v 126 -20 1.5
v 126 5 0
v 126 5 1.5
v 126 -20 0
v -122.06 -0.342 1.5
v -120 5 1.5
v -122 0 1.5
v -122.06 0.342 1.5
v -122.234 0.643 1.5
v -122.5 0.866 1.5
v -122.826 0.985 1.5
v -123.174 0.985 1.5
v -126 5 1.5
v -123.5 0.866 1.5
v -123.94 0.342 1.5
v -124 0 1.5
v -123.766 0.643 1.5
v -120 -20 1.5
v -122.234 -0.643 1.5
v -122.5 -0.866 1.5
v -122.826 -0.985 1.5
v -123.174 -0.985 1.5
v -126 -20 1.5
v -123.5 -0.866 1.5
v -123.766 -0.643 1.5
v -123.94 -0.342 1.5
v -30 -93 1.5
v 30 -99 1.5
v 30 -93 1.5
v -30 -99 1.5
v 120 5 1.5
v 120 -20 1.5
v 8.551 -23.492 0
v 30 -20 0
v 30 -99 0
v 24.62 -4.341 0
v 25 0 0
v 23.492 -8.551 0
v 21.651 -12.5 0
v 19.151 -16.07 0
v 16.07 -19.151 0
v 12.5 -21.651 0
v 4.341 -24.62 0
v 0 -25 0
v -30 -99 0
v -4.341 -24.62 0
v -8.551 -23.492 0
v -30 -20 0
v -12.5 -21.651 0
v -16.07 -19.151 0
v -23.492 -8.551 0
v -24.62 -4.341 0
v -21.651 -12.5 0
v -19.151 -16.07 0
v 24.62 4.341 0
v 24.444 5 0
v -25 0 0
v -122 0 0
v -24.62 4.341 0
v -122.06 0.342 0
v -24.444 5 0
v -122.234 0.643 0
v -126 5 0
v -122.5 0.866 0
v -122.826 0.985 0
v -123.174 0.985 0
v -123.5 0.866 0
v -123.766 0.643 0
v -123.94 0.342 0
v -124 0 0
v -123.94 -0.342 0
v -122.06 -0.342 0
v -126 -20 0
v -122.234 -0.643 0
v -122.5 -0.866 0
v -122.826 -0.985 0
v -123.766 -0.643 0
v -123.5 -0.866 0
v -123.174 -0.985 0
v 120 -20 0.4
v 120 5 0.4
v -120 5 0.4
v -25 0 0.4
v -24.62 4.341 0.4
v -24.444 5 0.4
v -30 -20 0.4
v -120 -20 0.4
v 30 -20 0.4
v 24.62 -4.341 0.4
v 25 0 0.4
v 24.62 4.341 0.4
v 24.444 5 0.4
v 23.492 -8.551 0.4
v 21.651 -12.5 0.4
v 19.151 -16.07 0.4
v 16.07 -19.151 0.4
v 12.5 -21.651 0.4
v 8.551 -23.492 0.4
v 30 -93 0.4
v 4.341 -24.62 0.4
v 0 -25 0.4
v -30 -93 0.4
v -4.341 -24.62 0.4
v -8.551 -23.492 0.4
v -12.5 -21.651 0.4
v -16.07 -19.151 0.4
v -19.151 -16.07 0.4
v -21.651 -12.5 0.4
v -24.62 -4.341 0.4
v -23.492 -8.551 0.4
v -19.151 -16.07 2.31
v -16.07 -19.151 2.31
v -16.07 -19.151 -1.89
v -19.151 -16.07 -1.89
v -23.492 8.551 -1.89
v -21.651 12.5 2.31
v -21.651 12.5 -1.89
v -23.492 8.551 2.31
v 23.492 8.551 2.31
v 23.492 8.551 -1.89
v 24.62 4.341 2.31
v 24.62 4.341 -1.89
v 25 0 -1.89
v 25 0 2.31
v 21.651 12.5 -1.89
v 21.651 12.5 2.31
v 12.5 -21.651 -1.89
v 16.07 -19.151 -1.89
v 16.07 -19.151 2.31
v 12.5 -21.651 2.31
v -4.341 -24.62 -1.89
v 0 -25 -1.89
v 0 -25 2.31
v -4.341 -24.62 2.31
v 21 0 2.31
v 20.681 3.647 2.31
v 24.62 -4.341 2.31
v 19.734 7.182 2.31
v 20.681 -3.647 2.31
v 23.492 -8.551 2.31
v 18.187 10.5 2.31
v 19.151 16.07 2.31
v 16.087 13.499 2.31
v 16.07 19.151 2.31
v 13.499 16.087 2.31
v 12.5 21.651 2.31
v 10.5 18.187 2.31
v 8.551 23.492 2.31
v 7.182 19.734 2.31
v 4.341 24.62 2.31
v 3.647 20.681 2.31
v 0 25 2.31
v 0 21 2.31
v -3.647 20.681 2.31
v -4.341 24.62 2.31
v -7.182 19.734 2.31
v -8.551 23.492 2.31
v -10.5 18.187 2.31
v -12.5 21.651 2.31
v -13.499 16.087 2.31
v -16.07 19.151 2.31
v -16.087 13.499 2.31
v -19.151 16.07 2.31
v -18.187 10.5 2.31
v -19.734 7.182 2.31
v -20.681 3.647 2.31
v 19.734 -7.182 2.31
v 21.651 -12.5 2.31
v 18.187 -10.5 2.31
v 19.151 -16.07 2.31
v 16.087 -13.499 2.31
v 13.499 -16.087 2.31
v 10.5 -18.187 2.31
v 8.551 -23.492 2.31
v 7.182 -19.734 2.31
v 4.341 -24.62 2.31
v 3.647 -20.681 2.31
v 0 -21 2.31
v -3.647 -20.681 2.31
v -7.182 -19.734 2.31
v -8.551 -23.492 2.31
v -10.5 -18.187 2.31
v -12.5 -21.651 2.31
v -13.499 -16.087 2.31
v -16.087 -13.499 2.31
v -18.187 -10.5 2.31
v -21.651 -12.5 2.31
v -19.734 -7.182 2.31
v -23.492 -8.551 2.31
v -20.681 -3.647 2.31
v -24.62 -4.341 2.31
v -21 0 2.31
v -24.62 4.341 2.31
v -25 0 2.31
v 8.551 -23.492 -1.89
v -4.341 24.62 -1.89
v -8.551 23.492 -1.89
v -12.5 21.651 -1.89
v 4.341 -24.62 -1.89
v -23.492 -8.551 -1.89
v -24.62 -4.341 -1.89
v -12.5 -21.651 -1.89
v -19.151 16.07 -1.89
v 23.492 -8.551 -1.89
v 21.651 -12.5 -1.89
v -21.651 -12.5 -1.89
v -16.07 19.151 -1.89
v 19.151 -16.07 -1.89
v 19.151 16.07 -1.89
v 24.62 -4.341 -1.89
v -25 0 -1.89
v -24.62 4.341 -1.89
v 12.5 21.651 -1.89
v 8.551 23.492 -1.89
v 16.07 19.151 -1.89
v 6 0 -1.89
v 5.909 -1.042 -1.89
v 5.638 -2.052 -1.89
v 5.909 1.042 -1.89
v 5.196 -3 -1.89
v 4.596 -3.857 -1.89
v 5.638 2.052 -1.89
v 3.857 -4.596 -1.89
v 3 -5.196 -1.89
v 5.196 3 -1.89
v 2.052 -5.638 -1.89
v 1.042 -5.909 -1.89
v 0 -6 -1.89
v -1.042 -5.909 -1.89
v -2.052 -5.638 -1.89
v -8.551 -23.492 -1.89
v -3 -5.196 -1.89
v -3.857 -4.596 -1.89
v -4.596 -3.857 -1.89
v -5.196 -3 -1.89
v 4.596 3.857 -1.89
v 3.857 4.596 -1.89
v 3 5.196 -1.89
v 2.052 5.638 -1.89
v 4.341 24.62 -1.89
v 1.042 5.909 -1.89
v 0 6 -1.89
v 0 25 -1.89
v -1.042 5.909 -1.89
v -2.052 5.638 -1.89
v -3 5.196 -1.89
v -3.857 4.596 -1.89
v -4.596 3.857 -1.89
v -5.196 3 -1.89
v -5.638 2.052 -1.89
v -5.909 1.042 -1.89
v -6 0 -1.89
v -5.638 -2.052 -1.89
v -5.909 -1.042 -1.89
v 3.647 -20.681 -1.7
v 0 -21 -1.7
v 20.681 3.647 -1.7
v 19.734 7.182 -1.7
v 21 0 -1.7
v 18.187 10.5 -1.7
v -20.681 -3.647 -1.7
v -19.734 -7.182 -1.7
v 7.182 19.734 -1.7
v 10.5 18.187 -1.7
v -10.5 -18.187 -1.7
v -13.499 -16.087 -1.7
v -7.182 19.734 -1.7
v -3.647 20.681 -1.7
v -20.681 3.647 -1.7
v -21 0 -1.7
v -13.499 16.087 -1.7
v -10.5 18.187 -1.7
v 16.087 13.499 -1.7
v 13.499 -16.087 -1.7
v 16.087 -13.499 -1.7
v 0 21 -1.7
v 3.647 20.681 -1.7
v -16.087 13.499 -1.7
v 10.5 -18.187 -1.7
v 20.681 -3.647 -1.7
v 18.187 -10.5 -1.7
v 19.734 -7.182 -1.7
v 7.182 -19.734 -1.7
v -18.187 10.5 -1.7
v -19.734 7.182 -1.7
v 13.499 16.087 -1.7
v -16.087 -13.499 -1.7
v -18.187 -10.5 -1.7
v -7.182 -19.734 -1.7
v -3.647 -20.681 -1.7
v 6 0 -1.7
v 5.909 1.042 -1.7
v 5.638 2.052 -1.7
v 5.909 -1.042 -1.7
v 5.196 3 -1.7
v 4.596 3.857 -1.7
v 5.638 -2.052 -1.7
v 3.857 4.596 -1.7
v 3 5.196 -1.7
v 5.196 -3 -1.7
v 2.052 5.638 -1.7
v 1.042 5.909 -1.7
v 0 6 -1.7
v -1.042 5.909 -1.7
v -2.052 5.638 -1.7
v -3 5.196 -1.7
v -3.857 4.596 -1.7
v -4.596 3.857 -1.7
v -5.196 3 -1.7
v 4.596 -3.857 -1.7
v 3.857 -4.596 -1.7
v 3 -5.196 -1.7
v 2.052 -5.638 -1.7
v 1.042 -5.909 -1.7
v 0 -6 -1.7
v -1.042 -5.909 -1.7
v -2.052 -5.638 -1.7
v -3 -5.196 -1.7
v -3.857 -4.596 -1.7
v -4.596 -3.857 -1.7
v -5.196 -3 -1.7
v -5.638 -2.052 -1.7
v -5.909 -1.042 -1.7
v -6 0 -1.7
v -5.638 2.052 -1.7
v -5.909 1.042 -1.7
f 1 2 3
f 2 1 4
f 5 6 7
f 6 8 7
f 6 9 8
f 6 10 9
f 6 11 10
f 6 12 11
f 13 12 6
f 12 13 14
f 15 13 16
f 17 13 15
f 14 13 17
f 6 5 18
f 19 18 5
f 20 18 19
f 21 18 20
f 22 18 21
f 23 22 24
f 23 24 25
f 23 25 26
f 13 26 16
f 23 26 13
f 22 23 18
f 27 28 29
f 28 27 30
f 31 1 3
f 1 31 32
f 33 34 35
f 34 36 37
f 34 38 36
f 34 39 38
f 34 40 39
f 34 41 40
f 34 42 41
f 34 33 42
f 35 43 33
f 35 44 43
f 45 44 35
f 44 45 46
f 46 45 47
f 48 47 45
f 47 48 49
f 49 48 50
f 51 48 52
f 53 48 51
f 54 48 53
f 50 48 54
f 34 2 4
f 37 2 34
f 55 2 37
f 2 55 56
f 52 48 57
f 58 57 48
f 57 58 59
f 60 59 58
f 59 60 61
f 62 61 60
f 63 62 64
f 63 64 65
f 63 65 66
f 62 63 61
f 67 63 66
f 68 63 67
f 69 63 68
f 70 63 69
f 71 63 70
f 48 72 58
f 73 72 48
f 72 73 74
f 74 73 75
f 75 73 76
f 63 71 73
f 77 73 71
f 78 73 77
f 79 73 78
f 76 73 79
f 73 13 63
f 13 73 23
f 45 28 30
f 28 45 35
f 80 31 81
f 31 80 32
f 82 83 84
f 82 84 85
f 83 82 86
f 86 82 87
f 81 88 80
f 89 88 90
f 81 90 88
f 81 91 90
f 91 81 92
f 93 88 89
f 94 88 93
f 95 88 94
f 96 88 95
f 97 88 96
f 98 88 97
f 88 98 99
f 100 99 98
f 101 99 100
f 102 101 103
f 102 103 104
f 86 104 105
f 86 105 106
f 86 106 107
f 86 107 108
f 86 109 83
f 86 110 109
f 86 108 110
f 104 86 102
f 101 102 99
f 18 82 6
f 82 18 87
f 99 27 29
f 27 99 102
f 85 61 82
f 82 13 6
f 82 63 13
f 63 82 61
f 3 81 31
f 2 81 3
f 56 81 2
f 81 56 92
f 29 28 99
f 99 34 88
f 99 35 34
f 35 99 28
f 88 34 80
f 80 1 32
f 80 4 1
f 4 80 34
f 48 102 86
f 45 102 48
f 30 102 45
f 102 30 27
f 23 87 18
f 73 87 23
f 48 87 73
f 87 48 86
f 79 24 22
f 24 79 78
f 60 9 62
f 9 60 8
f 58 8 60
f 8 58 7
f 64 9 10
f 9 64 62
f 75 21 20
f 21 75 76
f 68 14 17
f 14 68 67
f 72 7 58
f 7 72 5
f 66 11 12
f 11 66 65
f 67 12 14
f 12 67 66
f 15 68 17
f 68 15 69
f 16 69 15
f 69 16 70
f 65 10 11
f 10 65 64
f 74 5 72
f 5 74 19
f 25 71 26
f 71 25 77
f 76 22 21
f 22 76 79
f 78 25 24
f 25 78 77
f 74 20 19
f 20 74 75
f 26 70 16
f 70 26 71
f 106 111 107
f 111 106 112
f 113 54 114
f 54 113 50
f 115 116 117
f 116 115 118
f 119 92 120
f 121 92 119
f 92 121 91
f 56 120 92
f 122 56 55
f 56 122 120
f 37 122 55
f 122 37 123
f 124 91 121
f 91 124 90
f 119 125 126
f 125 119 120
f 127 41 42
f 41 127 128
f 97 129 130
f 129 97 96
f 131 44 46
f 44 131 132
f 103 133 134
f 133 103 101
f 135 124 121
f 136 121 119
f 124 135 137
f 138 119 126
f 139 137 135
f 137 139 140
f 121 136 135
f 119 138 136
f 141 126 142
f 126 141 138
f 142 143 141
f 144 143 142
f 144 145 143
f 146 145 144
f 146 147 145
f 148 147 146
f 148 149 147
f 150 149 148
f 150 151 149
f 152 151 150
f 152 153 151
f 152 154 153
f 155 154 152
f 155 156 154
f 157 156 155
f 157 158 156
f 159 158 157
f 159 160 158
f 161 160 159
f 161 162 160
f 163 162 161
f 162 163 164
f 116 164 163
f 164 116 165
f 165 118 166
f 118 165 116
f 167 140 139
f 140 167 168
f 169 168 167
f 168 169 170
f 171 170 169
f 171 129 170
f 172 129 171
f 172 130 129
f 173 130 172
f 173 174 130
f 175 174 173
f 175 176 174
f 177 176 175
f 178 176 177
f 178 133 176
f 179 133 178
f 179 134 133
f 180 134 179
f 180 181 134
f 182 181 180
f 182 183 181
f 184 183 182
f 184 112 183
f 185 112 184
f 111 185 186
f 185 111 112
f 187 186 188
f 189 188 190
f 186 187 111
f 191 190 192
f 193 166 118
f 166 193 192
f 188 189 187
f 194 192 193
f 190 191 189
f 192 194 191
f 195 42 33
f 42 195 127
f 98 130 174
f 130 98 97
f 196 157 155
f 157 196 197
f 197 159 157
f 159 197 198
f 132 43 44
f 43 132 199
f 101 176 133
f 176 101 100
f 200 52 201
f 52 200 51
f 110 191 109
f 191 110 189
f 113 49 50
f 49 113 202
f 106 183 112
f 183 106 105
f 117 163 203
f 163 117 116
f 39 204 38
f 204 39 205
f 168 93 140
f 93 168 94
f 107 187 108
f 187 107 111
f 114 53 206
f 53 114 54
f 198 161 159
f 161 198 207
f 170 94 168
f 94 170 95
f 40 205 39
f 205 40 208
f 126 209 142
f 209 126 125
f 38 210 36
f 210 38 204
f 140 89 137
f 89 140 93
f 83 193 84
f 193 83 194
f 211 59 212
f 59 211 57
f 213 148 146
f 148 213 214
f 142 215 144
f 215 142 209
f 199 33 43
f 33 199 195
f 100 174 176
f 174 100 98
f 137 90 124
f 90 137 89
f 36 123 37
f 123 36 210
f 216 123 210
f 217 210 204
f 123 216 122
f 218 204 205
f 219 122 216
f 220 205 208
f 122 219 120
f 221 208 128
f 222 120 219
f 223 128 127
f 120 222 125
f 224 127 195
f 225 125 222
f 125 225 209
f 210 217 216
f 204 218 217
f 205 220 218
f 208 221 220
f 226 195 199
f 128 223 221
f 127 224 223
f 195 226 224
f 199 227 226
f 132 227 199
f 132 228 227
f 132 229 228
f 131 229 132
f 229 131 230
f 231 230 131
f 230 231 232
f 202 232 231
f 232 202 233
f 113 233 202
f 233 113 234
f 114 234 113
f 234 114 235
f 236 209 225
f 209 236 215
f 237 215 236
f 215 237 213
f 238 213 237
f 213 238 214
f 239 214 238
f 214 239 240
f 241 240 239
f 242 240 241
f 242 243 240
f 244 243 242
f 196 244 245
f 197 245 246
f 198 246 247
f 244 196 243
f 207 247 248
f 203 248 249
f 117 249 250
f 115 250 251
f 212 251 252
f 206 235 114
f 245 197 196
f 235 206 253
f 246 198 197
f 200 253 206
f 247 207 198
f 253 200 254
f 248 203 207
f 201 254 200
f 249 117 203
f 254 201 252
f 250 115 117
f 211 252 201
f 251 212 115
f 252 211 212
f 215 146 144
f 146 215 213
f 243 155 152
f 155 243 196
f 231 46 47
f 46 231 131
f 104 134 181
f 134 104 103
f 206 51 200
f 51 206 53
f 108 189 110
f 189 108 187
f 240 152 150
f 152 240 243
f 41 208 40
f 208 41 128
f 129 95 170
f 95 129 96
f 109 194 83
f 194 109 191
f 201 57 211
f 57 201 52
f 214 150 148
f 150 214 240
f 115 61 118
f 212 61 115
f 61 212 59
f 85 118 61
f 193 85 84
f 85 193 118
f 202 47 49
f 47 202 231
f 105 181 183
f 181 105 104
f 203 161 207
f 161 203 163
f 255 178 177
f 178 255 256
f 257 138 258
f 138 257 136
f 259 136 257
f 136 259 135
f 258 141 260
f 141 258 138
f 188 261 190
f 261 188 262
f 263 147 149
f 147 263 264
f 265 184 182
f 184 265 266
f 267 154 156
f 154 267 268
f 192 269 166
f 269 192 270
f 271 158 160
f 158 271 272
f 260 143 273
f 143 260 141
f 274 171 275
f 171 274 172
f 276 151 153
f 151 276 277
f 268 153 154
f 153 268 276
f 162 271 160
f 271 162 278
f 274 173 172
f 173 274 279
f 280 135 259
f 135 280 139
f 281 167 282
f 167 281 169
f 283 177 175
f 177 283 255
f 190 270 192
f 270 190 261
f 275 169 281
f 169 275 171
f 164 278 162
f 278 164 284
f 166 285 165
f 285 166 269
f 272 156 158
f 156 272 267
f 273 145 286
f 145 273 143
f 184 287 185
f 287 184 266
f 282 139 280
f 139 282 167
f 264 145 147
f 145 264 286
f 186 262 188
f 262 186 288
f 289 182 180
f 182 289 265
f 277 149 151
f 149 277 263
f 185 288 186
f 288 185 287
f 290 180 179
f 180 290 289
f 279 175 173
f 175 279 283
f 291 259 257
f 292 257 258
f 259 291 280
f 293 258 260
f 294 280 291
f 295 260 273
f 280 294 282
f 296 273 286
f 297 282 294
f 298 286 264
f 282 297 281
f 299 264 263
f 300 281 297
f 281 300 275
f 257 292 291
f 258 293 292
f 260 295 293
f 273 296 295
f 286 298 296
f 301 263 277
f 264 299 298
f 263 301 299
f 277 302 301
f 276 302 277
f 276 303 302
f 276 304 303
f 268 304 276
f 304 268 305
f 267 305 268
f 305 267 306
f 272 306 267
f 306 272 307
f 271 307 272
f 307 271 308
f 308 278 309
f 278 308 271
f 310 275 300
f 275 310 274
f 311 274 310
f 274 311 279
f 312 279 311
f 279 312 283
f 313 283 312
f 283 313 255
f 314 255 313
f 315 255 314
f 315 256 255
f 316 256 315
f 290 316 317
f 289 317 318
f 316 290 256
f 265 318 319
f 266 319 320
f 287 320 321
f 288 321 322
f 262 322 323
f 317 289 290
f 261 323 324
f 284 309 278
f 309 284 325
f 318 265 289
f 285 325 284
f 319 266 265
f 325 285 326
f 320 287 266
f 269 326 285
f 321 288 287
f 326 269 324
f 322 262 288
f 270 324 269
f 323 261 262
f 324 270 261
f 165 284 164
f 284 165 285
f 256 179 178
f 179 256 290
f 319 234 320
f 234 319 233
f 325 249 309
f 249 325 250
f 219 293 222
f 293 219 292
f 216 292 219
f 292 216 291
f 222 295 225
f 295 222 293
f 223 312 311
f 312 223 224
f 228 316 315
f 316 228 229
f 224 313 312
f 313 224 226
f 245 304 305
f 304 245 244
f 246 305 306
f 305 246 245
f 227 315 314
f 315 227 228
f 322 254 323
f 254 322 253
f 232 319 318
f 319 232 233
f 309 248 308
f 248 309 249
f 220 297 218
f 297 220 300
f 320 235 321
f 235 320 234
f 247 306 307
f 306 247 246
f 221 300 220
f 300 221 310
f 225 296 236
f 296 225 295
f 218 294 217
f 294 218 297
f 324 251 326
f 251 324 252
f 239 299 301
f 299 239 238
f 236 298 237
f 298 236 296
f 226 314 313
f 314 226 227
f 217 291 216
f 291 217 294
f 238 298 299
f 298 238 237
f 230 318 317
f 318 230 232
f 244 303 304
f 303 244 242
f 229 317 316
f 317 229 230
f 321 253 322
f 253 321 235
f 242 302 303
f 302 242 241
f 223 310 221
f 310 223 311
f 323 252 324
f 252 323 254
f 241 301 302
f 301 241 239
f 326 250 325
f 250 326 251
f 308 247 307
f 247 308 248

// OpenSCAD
    // These are the outside dimensions of the tablet
    coef = 10;
    
    width=18.6*coef;
    height=24*coef;
    thickness=1.1;
    
    
    difference() {
    
    union() {
    
    difference() {
    
    translate([-(height+1.2*coef)/2+.15*coef,-(width+1.2*coef)/2+.3*coef,0]) {
        
    // cube général, extrude pour avoir les crochets au bout des bras
    difference() {
        translate([-.15*coef,-.3*coef,0]) cube([height+1.2*coef,width+1.2*coef,thickness+0.4]);
        translate([0.45*coef,0.3*coef,0.4]) cube([height,width,thickness+0.4]);
    }
    }
    union() {
         // on supprime le bras en y+
        translate([0,width/2+1.5*coef,0]) cube([height*2,width,thickness+10],center=true);
        
        translate([-10.5*coef,10.5*coef,.8]) cube([20*coef,20*coef,thickness+.7],center=true);
        translate([10.5*coef,10.5*coef,.8]) cube([20*coef,20*coef,thickness+.7],center=true);
        
        translate([13*coef,-9*coef,.8]) cube([20*coef,14*coef,thickness+.7],center=true);
        translate([-13*coef,-9*coef,.8]) cube([20*coef,14*coef,thickness+.7],center=true);
        
        translate([0,width/2+2.5*coef,.8]) cube([8*coef,4*coef,thickness+.7],center=true);
        
        //translate([-10.5*coef,-10.5*coef,.8]) cube([20*coef,20*coef,thickness+.7],center=true);
        //translate([height/4-1.5*coef,-11*coef,.8]) cube([height/2-4*coef,20*coef,thickness+.7],center=true);
        //translate([height/4-1.5*coef,11*coef,.8]) cube([height/2-4*coef,20*coef,thickness+.7],center=true);
        
       

        //translate([9*coef,-13*coef,.8]) cube([14*coef,20*coef,thickness+.7],center=true);
        //translate([9*coef,13*coef,.8]) cube([14*coef,20*coef,thickness+.7],center=true);
        //translate([height/2+2.5*coef,0,.8]) cube([8*coef,4*coef,thickness+.7],center=true);
        //translate([0,-width/2-.3*coef,1.1]) cylinder(h=1*coef,r=0.1*coef,$fn=18,center=true);
        //translate([0,width/2+.3*coef,1.1]) cylinder(h=1*coef,r=0.1*coef,$fn=18,center=true);
        
        // double bras
        /*translate([9*coef,-13*coef,.8]) cube([14*coef,20*coef,thickness+.7],center=true);
        translate([9*coef,13*coef,.8]) cube([14*coef,20*coef,thickness+.7],center=true);
        translate([height/2+2.5*coef,0,.8]) cube([8*coef,4*coef,thickness+.7],center=true);
        translate([0,-width/2-.3*coef,1.1]) cylinder(h=1*coef,r=0.1*coef,$fn=18,center=true);
        translate([0,width/2+.3*coef,1.1]) cylinder(h=1*coef,r=0.1*coef,$fn=18,center=true);*/
       
        translate([height/2+.3*coef,-2.5*coef,1.1]) cylinder(h=1*coef,r=0.1*coef,$fn=18,center=true);
        translate([height/2+.3*coef,2.5*coef,1.1]) cylinder(h=1*coef,r=0.1*coef,$fn=18,center=true);
        translate([-height/2-.3*coef,0,1.1]) cylinder(h=1*coef,r=0.1*coef,$fn=18,center=true);
    }
    }
    translate([0,0,.21]) cylinder(h=.42*coef,r=2.5*coef,$fn=36,center=true);
    }
    union() {
    translate([0,0,.4]) cylinder(h=.42*coef,r=2.1*coef,$fn=36,center=true);
    translate([0,0,0]) cylinder(h=.8*coef,r=0.6*coef,$fn=36,center=true);
    }
    }
